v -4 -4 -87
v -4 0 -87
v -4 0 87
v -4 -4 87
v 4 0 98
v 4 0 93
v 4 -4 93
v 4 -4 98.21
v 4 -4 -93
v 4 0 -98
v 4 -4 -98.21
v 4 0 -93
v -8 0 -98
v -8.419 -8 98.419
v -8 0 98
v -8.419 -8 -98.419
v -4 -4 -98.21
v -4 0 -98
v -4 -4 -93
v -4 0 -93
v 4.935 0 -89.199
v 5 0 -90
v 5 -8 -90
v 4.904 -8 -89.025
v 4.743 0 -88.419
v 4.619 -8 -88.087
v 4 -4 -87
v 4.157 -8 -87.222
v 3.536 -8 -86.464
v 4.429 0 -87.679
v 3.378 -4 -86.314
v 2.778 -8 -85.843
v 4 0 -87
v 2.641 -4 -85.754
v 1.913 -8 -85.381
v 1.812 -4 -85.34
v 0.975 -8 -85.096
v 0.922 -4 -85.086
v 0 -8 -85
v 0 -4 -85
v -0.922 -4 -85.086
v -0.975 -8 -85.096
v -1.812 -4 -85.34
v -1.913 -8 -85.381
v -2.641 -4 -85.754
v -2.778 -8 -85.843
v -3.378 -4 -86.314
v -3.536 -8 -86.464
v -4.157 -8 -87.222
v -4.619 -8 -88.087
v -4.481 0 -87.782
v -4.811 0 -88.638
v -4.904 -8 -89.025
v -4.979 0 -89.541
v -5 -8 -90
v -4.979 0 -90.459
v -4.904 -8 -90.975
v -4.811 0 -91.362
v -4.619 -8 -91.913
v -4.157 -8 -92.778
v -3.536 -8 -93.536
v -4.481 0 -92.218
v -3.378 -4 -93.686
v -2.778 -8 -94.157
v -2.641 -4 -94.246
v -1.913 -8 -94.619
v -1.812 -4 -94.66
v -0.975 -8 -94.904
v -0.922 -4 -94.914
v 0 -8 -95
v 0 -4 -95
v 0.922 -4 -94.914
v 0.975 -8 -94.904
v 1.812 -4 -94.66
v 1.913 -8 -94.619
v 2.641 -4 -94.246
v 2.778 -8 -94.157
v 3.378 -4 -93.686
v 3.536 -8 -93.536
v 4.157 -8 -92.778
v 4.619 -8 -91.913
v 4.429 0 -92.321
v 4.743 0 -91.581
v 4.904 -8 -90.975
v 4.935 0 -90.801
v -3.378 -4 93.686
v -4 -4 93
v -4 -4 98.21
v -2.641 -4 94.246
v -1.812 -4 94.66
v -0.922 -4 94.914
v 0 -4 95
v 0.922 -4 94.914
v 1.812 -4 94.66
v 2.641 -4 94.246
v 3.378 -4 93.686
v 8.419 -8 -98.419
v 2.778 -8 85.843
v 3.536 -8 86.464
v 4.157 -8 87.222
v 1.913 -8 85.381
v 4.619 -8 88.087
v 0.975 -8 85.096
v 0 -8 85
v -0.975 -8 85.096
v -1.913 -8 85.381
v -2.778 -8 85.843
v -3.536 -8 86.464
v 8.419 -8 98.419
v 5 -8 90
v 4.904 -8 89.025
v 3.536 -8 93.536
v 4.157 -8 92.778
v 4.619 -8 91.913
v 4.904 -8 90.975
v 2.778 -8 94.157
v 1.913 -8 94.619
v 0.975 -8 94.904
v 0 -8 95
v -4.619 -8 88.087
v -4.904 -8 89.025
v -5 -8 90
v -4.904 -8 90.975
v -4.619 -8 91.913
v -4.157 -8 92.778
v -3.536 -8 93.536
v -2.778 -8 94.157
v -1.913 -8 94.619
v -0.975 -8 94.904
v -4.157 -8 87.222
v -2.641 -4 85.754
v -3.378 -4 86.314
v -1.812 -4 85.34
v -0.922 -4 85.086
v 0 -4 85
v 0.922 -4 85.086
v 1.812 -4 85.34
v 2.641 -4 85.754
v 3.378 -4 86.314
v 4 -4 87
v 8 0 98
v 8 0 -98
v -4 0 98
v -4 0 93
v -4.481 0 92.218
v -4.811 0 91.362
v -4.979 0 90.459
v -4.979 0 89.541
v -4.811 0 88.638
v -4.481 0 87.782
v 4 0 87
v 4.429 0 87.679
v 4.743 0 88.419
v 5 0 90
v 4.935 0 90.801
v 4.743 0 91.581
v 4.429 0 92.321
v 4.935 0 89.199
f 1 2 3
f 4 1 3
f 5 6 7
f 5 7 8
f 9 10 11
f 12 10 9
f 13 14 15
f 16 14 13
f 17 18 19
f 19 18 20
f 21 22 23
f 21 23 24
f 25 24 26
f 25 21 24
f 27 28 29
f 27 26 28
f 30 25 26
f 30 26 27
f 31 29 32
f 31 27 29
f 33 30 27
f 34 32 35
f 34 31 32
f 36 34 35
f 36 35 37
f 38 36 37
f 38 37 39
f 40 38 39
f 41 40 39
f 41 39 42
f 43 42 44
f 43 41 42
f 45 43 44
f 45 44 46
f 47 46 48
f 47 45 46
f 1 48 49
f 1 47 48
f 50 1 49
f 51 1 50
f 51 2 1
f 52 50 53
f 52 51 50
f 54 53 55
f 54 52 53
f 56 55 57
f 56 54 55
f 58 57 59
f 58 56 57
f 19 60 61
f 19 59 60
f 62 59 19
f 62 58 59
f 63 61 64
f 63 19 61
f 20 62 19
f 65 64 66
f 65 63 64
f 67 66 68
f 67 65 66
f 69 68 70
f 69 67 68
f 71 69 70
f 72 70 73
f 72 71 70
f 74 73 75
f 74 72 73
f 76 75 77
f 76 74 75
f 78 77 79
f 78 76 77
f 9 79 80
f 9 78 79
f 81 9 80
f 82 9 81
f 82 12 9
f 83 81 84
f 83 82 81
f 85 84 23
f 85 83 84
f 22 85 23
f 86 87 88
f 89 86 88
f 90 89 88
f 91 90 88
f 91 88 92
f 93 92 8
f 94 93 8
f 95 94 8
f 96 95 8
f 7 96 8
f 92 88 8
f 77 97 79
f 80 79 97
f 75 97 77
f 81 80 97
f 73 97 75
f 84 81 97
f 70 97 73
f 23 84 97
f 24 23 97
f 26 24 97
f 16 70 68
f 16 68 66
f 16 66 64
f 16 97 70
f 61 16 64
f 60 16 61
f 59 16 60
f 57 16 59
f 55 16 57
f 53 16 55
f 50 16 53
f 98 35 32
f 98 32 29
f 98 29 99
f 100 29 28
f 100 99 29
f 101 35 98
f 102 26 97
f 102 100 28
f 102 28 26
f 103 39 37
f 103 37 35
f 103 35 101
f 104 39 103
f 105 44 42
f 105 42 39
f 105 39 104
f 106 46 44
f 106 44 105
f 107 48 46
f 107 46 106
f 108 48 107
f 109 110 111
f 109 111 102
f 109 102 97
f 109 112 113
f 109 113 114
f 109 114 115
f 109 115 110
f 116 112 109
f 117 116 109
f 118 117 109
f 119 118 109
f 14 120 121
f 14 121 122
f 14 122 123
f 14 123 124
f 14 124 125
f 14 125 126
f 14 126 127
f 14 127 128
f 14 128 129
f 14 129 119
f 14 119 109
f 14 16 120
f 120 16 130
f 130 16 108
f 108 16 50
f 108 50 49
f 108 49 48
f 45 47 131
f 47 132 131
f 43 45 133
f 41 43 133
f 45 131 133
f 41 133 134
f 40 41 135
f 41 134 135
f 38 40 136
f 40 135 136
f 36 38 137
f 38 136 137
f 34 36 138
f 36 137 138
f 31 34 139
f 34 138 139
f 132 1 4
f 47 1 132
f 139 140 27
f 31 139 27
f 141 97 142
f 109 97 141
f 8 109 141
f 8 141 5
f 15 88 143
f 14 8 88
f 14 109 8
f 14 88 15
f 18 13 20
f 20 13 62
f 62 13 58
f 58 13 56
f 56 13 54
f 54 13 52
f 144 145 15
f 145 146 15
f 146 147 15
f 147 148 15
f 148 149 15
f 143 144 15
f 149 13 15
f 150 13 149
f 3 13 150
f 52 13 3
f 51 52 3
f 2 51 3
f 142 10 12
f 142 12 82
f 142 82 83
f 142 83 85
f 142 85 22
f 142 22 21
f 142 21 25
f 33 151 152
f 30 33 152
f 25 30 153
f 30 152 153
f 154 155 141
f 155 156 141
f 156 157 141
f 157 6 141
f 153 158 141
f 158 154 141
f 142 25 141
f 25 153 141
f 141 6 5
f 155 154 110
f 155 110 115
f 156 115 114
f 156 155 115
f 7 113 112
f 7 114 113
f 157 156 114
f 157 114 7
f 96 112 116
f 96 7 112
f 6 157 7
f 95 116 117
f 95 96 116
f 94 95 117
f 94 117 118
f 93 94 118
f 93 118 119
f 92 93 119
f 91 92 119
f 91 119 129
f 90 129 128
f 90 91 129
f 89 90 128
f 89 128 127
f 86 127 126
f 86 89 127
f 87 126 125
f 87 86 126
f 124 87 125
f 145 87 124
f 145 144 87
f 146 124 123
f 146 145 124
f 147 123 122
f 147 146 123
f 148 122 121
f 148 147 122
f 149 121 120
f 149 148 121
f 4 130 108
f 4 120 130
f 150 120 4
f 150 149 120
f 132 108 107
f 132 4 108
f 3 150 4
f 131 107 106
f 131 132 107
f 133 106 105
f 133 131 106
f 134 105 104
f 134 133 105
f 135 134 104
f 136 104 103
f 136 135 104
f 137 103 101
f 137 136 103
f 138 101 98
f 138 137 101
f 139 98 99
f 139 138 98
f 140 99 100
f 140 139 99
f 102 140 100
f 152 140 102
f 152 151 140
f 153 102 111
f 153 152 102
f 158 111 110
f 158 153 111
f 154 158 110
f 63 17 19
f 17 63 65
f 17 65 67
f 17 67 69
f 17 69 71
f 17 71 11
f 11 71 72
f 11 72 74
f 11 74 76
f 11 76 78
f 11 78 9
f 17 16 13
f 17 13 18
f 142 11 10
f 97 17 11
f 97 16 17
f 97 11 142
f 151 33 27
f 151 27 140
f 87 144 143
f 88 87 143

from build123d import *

# Parameters (mm, degrees)
F0_W     = 16
F0_H     = 196
F1_DEPTH = 8
F1_TAPER = -3
F2_W     = 8
F2_H     = 200
F3_DEPTH = 4
F4_R     = 5
F5_DEPTH = 25.4


with BuildPart() as f1:
    # F0 (on Front) → F1 (new body)
    with BuildSketch(Plane.XZ):
        Rectangle(F0_W, F0_H)
    extrude(amount=F1_DEPTH, taper=F1_TAPER)

    # F2 (on face) → F3 (cut)
    with BuildSketch(Plane.XZ):
        Rectangle(F2_W, F2_H)
    extrude(amount=F3_DEPTH, mode=Mode.SUBTRACT)

    # F4 (on Front) → F5 (cut)
    with BuildSketch(Plane.XZ):
        with Locations((0, 90)):
            Circle(F4_R)
        with Locations((0, -90)):
            Circle(F4_R)
    extrude(amount=F5_DEPTH, mode=Mode.SUBTRACT)


solid = f1.part
